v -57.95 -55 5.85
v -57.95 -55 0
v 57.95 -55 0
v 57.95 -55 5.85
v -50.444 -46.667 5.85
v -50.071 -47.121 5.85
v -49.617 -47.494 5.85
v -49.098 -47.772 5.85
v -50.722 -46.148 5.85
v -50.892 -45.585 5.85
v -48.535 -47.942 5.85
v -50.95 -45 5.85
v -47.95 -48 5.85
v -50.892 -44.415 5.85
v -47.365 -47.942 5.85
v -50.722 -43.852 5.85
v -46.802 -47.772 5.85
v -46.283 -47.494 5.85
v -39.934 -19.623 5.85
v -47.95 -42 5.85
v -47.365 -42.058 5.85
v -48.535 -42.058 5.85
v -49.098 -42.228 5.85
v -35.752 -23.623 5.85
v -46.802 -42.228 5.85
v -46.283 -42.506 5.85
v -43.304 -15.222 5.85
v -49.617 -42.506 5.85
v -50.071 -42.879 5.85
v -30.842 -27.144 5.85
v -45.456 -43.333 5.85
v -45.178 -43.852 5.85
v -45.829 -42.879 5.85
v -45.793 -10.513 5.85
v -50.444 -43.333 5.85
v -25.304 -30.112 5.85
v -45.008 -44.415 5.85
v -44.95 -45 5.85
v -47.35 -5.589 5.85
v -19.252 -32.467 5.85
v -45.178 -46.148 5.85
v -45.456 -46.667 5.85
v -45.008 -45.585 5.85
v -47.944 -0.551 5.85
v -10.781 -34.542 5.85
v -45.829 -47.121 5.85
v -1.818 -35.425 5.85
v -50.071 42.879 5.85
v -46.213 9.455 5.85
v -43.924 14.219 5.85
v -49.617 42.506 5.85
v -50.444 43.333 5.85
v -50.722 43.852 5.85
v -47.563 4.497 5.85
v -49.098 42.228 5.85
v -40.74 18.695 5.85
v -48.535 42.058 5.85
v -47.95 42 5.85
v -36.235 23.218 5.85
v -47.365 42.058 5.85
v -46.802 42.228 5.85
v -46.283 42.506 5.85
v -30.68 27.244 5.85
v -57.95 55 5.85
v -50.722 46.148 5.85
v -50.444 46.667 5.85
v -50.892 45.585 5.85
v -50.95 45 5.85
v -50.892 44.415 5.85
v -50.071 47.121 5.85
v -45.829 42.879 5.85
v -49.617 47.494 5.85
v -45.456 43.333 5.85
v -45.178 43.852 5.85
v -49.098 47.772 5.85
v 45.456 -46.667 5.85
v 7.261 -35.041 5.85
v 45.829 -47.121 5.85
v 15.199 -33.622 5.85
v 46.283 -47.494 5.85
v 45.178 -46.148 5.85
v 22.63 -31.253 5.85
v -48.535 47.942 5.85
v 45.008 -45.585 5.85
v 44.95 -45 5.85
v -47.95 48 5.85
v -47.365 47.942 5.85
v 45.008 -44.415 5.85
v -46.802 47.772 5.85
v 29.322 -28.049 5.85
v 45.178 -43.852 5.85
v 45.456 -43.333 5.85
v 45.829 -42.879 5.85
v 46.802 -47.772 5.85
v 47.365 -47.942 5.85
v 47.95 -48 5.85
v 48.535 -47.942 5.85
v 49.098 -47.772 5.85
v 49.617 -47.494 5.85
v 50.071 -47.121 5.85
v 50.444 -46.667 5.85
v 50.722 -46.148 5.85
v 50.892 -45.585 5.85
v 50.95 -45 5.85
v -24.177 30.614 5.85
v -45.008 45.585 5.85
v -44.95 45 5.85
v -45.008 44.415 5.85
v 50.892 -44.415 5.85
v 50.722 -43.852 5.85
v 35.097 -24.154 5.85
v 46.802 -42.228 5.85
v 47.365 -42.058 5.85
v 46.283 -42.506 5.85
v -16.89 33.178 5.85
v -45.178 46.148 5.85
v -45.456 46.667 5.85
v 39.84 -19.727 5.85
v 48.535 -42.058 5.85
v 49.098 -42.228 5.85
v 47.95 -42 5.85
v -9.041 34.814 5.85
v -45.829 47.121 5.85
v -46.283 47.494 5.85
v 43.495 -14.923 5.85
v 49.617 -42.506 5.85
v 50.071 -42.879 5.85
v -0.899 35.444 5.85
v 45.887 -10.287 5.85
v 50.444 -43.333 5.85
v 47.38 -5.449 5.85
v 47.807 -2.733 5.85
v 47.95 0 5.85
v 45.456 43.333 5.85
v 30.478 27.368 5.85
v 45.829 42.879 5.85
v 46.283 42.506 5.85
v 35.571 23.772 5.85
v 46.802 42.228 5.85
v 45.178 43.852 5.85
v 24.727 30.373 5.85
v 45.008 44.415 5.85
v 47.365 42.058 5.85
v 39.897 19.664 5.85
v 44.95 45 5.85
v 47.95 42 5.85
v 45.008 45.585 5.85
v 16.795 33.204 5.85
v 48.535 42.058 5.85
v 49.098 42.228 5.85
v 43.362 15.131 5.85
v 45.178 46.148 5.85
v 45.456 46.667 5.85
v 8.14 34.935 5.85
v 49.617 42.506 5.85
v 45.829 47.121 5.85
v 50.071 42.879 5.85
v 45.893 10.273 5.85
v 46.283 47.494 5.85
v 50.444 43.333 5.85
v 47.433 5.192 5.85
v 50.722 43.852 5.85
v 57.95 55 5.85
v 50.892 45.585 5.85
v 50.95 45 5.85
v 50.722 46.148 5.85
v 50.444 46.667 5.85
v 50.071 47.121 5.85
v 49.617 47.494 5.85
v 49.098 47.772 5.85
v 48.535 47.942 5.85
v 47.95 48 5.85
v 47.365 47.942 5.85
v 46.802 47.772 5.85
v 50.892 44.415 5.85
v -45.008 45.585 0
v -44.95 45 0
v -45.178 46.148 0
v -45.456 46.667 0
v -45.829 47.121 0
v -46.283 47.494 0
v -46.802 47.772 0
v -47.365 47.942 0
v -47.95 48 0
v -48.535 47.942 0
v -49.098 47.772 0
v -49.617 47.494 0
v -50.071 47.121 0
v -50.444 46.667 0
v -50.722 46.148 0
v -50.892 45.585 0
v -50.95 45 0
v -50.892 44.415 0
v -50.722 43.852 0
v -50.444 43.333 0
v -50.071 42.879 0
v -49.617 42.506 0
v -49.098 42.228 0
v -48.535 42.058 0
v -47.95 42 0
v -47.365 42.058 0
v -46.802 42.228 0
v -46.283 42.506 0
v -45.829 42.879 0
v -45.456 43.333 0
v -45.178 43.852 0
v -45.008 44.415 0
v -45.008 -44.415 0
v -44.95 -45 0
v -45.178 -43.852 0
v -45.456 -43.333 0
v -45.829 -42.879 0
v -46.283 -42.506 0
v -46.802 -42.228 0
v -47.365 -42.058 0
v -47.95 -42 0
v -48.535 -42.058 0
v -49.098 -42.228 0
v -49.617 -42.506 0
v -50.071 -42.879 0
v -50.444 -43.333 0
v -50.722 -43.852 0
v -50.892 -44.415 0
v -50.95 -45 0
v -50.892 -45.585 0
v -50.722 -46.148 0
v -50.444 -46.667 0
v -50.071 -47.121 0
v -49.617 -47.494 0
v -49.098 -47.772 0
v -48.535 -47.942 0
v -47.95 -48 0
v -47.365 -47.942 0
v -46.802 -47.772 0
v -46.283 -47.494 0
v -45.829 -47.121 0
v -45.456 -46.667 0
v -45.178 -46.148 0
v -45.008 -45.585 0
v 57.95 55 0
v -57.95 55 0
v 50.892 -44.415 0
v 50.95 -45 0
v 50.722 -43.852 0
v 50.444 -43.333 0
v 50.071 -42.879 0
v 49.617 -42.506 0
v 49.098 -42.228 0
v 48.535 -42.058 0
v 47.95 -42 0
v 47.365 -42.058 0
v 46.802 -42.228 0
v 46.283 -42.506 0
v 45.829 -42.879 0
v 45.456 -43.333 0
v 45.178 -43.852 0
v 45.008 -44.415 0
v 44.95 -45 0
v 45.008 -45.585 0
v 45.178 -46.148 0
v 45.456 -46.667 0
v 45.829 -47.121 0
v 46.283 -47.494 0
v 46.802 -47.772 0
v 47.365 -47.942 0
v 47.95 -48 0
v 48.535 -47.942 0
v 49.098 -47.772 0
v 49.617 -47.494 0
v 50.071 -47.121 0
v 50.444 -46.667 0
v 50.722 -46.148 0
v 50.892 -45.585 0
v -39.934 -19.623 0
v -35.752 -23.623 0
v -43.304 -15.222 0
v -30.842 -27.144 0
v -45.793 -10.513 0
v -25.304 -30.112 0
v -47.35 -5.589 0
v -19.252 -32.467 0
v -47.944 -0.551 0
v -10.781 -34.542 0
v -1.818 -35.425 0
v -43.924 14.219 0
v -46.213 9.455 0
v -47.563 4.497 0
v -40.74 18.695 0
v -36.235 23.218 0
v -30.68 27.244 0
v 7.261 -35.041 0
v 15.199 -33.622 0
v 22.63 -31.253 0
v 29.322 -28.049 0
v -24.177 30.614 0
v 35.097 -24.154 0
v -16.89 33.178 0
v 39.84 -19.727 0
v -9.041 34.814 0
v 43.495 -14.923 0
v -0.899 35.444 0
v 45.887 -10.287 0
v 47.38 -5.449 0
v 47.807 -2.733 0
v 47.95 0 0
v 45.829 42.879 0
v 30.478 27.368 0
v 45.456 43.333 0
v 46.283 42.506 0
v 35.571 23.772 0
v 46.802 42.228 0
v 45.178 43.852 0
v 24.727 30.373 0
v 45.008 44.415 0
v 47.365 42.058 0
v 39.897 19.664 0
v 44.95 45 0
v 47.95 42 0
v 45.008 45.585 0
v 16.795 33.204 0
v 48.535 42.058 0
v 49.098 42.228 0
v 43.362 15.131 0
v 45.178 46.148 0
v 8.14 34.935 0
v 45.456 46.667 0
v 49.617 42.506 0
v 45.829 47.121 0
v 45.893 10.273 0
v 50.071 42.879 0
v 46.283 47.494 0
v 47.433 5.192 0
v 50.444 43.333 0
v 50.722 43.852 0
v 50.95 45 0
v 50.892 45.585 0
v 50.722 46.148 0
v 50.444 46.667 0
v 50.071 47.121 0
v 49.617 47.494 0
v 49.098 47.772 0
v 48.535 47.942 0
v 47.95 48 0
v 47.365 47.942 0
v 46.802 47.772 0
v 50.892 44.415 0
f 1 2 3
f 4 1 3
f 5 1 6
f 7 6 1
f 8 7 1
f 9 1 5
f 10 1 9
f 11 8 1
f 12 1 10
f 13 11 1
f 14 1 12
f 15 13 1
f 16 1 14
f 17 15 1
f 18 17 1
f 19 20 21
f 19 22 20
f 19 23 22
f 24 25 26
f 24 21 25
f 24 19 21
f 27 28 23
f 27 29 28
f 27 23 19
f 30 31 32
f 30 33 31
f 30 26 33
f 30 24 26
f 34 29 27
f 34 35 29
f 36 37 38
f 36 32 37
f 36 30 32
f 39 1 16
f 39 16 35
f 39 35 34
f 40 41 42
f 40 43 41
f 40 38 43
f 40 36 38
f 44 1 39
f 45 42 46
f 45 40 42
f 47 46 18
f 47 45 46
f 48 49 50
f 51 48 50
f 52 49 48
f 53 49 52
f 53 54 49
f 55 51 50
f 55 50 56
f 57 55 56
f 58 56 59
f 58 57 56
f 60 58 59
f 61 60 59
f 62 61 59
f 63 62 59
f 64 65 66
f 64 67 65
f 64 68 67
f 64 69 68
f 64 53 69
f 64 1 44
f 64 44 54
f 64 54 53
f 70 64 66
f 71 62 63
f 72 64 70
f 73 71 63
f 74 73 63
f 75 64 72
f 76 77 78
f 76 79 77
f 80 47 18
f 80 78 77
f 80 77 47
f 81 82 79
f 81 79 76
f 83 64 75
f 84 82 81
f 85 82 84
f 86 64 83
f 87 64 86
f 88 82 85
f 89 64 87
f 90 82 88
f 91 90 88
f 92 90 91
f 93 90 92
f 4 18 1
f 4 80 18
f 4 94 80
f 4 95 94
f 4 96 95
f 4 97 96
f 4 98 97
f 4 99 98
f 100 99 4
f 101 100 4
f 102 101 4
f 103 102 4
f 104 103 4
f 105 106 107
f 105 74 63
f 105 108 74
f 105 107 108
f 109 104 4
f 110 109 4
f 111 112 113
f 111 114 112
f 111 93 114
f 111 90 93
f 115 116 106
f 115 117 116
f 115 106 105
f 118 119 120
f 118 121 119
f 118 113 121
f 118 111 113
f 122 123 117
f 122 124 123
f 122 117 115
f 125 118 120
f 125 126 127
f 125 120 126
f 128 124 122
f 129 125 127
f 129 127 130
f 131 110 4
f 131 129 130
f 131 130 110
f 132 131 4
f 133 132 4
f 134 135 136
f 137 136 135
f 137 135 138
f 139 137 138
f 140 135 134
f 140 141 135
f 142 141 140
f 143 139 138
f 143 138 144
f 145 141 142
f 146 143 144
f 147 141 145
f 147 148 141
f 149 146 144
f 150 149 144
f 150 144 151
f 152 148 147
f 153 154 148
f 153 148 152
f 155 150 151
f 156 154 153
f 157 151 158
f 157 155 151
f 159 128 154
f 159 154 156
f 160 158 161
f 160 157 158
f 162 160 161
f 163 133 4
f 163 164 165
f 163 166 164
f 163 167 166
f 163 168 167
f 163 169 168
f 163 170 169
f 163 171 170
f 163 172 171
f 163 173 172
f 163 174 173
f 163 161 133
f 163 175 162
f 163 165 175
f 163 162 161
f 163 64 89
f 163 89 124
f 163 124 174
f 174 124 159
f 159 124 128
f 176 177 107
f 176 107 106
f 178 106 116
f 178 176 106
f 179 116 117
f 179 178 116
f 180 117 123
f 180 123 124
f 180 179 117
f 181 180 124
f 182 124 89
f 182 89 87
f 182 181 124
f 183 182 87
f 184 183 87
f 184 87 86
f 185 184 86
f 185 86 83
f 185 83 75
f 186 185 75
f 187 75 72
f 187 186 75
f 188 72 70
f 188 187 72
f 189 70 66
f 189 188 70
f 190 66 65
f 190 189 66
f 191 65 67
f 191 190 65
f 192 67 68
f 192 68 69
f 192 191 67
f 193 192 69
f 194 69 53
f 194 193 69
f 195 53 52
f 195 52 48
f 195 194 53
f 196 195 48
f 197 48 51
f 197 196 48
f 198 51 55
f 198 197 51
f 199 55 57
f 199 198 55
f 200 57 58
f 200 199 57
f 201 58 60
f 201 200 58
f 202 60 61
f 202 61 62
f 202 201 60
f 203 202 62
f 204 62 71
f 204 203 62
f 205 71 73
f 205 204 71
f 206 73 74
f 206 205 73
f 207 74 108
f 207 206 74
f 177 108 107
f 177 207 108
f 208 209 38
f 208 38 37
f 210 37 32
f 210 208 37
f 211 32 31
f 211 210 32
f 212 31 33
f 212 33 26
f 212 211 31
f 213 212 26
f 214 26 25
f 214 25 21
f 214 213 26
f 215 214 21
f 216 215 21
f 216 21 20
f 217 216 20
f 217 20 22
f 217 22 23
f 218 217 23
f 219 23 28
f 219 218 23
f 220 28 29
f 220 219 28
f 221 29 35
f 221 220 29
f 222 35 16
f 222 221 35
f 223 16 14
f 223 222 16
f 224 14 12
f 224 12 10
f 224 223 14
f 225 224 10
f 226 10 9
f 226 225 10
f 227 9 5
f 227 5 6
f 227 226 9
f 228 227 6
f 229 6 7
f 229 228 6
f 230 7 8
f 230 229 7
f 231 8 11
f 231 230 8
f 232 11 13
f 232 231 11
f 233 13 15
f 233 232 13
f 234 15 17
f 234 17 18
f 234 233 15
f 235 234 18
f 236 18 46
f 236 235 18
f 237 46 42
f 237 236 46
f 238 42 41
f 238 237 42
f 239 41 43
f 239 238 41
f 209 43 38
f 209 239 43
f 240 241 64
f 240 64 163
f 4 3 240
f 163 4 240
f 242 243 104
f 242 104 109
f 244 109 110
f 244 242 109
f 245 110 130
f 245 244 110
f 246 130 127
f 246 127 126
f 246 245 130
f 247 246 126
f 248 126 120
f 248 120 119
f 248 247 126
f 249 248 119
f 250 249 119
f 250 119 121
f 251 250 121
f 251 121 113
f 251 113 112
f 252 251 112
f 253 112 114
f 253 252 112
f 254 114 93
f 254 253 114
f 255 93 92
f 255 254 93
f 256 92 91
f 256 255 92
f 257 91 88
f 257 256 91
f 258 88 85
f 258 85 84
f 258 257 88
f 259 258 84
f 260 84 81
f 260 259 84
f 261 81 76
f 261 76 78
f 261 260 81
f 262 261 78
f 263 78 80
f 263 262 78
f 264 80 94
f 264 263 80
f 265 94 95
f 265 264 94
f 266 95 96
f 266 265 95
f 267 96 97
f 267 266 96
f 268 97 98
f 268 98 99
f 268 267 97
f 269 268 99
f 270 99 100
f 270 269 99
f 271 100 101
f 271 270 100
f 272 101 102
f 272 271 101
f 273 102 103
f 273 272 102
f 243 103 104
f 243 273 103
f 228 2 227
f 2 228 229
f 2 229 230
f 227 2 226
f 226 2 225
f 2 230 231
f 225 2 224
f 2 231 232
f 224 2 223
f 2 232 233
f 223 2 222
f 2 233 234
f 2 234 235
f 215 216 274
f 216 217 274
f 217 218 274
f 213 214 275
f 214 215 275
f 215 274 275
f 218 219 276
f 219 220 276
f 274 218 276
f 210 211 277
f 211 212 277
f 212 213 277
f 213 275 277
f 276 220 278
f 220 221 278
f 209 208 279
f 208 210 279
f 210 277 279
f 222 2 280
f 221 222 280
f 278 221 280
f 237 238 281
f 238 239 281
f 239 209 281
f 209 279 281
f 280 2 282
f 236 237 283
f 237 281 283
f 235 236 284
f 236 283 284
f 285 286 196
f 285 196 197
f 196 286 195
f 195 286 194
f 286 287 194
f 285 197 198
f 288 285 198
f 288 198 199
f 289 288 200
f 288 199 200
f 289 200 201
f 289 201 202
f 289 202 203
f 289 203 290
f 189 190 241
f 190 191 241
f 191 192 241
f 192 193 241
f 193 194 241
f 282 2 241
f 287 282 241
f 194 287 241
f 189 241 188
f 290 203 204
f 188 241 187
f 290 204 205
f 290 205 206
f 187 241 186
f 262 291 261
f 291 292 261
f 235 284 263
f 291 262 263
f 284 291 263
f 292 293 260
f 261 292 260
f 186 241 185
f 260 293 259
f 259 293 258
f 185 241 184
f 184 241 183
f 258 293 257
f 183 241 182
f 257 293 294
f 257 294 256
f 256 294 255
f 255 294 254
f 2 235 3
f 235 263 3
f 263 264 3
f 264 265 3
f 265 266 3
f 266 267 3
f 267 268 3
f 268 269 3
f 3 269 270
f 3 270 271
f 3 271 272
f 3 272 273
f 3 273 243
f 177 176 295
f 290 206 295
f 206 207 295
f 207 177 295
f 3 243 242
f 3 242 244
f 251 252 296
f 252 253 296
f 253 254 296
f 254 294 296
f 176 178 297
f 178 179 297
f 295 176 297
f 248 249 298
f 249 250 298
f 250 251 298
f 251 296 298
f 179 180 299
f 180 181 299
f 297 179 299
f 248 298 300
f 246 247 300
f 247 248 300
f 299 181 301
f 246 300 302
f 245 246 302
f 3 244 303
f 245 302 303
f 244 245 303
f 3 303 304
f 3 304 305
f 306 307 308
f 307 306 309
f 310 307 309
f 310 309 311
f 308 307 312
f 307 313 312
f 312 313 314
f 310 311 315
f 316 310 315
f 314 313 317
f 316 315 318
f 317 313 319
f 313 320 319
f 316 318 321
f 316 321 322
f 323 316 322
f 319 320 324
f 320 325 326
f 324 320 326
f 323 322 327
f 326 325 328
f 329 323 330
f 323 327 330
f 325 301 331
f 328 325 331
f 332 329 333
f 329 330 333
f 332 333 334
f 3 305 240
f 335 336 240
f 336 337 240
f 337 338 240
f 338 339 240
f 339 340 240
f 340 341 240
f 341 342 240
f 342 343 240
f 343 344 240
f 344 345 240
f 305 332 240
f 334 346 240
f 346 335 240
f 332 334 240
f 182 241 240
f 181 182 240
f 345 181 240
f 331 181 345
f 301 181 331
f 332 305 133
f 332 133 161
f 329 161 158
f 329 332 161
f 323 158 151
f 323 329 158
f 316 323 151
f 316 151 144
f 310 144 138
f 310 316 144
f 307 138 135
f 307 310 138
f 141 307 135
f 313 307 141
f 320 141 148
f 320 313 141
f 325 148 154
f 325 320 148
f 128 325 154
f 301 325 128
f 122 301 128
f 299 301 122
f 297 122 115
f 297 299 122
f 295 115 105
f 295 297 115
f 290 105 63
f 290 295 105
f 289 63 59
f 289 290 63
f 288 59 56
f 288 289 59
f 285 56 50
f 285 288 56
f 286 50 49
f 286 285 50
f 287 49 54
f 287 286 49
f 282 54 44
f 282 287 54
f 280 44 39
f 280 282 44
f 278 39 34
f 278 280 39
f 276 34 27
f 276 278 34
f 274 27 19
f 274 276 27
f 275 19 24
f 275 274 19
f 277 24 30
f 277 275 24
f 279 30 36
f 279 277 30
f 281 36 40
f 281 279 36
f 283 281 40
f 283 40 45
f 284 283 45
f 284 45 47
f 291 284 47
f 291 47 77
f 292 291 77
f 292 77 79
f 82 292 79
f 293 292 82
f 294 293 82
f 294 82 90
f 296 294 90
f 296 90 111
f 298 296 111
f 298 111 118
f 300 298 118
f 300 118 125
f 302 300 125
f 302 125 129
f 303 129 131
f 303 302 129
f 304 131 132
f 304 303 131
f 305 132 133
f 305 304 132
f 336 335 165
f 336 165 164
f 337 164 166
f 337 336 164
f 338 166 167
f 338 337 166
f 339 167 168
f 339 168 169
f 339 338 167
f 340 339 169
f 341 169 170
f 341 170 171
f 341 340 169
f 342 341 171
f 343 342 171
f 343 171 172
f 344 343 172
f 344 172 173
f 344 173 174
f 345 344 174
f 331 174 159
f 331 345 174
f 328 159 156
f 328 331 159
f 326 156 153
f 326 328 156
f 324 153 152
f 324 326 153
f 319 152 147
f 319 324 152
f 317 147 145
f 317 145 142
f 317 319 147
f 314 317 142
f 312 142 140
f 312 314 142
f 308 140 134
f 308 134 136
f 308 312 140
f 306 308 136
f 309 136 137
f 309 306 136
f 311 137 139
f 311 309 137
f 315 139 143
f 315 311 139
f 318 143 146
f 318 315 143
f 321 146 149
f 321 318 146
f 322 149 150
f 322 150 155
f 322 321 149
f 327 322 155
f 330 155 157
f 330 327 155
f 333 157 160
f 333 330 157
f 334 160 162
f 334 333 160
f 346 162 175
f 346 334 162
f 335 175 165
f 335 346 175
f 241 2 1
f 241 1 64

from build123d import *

# Parameters (mm, degrees)
SKETCH1_W           = 115.9
SKETCH1_H           = 110
SKETCH1_R           = 3
SKETCH1_RX          = 47.95
SKETCH1_RY          = 35.45
BOSS_EXTRUDE1_DEPTH = 5.85


with BuildPart() as part:
    # Sketch1 → Boss-Extrude1 (new body)
    with BuildSketch(Plane.XY):
        Rectangle(SKETCH1_W, SKETCH1_H)
        with Locations((-47.95, 45)):
            Circle(SKETCH1_R, mode=Mode.SUBTRACT)
        with Locations((-47.95, -45)):
            Circle(SKETCH1_R, mode=Mode.SUBTRACT)
        with Locations((47.95, -45)):
            Circle(SKETCH1_R, mode=Mode.SUBTRACT)
        with Locations((47.95, 45)):
            Circle(SKETCH1_R, mode=Mode.SUBTRACT)
        with Locations((0, 0)):
            Ellipse(SKETCH1_RX, SKETCH1_RY, mode=Mode.SUBTRACT)
    extrude(amount=BOSS_EXTRUDE1_DEPTH)


solid = part.part
